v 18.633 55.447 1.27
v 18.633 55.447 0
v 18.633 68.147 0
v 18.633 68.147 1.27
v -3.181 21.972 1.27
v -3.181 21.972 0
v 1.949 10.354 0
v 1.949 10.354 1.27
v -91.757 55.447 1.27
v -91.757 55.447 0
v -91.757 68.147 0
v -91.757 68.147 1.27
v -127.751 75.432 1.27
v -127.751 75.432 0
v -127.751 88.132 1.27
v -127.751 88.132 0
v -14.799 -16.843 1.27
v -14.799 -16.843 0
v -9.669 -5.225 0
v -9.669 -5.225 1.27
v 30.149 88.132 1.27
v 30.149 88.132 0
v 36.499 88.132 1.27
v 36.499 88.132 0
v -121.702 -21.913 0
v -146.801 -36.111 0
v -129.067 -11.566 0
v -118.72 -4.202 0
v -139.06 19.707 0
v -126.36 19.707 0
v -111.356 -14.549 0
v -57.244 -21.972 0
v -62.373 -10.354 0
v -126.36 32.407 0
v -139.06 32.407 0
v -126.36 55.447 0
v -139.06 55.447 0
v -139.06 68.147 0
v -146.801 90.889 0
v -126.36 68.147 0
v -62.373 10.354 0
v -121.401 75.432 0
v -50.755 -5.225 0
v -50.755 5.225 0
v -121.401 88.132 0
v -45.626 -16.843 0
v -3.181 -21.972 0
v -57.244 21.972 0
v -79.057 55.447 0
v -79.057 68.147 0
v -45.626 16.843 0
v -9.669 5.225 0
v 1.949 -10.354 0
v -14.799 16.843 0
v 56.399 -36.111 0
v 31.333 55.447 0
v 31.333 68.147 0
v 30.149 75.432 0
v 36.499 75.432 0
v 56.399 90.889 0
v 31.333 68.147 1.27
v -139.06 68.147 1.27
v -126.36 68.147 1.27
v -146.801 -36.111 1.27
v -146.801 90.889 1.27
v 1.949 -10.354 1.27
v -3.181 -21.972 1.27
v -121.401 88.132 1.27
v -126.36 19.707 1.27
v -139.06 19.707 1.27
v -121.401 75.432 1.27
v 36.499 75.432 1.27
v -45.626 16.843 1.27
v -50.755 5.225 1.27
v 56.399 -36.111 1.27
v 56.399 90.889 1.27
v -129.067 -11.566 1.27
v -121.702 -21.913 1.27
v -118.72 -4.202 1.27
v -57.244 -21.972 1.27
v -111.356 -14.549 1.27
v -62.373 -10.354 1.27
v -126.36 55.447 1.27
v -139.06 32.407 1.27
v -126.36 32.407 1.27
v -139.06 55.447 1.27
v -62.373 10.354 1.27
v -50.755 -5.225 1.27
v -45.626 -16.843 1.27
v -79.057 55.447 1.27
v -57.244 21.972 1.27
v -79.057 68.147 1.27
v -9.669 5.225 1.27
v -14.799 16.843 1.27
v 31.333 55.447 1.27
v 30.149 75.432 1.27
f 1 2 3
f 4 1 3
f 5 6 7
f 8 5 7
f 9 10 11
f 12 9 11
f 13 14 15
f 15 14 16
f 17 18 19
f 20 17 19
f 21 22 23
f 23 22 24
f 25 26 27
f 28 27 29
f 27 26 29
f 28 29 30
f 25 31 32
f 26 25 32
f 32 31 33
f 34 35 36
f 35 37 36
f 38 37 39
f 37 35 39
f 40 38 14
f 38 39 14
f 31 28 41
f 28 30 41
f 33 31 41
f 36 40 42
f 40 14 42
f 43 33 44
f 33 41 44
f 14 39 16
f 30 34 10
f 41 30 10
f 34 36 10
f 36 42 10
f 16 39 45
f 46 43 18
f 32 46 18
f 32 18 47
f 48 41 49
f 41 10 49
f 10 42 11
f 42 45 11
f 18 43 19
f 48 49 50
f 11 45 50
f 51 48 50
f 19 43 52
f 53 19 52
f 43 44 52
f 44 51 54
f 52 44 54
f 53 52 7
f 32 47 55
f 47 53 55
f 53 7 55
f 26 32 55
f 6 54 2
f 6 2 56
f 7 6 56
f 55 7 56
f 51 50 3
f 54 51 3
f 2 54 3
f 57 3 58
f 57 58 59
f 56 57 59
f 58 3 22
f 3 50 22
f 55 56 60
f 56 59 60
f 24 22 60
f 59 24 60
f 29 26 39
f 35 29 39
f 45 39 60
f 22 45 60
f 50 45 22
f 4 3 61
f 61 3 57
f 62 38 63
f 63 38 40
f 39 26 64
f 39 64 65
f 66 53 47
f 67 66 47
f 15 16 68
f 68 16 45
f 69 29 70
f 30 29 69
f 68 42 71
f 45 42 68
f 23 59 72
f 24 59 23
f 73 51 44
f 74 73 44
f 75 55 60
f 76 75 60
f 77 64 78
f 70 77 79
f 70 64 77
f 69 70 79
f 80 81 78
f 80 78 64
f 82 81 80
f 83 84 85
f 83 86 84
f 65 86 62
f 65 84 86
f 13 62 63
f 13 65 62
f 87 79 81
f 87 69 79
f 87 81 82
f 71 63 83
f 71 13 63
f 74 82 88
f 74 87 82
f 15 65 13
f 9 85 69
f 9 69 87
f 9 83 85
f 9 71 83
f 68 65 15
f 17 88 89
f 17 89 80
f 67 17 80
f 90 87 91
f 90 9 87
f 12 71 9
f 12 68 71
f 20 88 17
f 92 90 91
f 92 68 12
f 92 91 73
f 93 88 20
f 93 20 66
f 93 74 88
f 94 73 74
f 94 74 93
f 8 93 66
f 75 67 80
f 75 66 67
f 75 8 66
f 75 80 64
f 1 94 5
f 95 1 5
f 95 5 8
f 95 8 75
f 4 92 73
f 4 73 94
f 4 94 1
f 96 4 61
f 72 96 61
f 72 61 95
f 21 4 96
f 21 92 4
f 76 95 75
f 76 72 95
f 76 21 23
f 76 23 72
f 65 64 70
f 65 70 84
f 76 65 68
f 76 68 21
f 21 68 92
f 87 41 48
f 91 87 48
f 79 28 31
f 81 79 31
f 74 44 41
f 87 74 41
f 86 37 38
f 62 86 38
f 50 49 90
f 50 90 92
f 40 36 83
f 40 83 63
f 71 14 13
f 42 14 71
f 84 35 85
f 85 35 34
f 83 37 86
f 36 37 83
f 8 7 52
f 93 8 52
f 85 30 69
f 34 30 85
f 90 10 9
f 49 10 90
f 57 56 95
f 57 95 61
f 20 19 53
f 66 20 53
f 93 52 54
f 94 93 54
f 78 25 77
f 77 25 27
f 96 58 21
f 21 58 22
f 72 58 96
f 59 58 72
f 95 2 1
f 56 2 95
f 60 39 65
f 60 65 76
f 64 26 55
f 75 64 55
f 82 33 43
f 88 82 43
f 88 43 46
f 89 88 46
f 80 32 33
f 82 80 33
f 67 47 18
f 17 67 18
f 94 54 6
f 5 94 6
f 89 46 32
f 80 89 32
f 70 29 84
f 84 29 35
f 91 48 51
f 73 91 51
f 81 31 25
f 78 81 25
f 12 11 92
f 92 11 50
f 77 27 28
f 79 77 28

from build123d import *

# Parameters (mm, degrees)
F0_W     = 203.2
F0_H     = 127
F0_W_2   = 12.7
F0_H_2   = 12.7
F0_W_3   = 6.35
F1_DEPTH = 1.27


with BuildPart() as f1:
    # F0 (on Top) → F1 (new body)
    with BuildSketch(Plane.XY):
        with Locations((-45.201082, 27.389223)):
            Rectangle(F0_W, F0_H)
        Polygon((-121.702438, -21.913276), (-129.066739, -11.566438), (-118.719901, -4.202136), (-111.355599, -14.548975), align=None, mode=Mode.SUBTRACT)
        Polygon((-50.755317, -5.224569), (-45.62584, -16.842592), (-57.243863, -21.972069), (-62.373341, -10.354046), align=None, mode=Mode.SUBTRACT)
        with Locations((-132.709693, 26.056859)):
            Rectangle(F0_W_2, F0_H_2, mode=Mode.SUBTRACT)
        Polygon((-57.243863, 21.972069), (-45.62584, 16.842592), (-50.755317, 5.224569), (-62.373341, 10.354046), align=None, mode=Mode.SUBTRACT)
        Polygon((-3.180643, -21.972069), (-14.798667, -16.842592), (-9.669189, -5.224569), (1.948834, -10.354046), align=None, mode=Mode.SUBTRACT)
        Polygon((-9.669189, 5.224569), (-14.798667, 16.842592), (-3.180643, 21.972069), (1.948834, 10.354046), align=None, mode=Mode.SUBTRACT)
        with Locations((-132.709693, 61.797474)):
            Rectangle(F0_W_2, F0_H_2, mode=Mode.SUBTRACT)
        with Locations((-124.576082, 81.781995)):
            Rectangle(F0_W_3, F0_H_2, mode=Mode.SUBTRACT)
        with Locations((-85.407068, 61.797474)):
            Rectangle(F0_W_2, F0_H_2, mode=Mode.SUBTRACT)
        with Locations((24.982561, 61.797474)):
            Rectangle(F0_W_2, F0_H_2, mode=Mode.SUBTRACT)
        with Locations((33.324402, 81.781995)):
            Rectangle(F0_W_3, F0_H_2, mode=Mode.SUBTRACT)
    extrude(amount=F1_DEPTH)


solid = f1.part
